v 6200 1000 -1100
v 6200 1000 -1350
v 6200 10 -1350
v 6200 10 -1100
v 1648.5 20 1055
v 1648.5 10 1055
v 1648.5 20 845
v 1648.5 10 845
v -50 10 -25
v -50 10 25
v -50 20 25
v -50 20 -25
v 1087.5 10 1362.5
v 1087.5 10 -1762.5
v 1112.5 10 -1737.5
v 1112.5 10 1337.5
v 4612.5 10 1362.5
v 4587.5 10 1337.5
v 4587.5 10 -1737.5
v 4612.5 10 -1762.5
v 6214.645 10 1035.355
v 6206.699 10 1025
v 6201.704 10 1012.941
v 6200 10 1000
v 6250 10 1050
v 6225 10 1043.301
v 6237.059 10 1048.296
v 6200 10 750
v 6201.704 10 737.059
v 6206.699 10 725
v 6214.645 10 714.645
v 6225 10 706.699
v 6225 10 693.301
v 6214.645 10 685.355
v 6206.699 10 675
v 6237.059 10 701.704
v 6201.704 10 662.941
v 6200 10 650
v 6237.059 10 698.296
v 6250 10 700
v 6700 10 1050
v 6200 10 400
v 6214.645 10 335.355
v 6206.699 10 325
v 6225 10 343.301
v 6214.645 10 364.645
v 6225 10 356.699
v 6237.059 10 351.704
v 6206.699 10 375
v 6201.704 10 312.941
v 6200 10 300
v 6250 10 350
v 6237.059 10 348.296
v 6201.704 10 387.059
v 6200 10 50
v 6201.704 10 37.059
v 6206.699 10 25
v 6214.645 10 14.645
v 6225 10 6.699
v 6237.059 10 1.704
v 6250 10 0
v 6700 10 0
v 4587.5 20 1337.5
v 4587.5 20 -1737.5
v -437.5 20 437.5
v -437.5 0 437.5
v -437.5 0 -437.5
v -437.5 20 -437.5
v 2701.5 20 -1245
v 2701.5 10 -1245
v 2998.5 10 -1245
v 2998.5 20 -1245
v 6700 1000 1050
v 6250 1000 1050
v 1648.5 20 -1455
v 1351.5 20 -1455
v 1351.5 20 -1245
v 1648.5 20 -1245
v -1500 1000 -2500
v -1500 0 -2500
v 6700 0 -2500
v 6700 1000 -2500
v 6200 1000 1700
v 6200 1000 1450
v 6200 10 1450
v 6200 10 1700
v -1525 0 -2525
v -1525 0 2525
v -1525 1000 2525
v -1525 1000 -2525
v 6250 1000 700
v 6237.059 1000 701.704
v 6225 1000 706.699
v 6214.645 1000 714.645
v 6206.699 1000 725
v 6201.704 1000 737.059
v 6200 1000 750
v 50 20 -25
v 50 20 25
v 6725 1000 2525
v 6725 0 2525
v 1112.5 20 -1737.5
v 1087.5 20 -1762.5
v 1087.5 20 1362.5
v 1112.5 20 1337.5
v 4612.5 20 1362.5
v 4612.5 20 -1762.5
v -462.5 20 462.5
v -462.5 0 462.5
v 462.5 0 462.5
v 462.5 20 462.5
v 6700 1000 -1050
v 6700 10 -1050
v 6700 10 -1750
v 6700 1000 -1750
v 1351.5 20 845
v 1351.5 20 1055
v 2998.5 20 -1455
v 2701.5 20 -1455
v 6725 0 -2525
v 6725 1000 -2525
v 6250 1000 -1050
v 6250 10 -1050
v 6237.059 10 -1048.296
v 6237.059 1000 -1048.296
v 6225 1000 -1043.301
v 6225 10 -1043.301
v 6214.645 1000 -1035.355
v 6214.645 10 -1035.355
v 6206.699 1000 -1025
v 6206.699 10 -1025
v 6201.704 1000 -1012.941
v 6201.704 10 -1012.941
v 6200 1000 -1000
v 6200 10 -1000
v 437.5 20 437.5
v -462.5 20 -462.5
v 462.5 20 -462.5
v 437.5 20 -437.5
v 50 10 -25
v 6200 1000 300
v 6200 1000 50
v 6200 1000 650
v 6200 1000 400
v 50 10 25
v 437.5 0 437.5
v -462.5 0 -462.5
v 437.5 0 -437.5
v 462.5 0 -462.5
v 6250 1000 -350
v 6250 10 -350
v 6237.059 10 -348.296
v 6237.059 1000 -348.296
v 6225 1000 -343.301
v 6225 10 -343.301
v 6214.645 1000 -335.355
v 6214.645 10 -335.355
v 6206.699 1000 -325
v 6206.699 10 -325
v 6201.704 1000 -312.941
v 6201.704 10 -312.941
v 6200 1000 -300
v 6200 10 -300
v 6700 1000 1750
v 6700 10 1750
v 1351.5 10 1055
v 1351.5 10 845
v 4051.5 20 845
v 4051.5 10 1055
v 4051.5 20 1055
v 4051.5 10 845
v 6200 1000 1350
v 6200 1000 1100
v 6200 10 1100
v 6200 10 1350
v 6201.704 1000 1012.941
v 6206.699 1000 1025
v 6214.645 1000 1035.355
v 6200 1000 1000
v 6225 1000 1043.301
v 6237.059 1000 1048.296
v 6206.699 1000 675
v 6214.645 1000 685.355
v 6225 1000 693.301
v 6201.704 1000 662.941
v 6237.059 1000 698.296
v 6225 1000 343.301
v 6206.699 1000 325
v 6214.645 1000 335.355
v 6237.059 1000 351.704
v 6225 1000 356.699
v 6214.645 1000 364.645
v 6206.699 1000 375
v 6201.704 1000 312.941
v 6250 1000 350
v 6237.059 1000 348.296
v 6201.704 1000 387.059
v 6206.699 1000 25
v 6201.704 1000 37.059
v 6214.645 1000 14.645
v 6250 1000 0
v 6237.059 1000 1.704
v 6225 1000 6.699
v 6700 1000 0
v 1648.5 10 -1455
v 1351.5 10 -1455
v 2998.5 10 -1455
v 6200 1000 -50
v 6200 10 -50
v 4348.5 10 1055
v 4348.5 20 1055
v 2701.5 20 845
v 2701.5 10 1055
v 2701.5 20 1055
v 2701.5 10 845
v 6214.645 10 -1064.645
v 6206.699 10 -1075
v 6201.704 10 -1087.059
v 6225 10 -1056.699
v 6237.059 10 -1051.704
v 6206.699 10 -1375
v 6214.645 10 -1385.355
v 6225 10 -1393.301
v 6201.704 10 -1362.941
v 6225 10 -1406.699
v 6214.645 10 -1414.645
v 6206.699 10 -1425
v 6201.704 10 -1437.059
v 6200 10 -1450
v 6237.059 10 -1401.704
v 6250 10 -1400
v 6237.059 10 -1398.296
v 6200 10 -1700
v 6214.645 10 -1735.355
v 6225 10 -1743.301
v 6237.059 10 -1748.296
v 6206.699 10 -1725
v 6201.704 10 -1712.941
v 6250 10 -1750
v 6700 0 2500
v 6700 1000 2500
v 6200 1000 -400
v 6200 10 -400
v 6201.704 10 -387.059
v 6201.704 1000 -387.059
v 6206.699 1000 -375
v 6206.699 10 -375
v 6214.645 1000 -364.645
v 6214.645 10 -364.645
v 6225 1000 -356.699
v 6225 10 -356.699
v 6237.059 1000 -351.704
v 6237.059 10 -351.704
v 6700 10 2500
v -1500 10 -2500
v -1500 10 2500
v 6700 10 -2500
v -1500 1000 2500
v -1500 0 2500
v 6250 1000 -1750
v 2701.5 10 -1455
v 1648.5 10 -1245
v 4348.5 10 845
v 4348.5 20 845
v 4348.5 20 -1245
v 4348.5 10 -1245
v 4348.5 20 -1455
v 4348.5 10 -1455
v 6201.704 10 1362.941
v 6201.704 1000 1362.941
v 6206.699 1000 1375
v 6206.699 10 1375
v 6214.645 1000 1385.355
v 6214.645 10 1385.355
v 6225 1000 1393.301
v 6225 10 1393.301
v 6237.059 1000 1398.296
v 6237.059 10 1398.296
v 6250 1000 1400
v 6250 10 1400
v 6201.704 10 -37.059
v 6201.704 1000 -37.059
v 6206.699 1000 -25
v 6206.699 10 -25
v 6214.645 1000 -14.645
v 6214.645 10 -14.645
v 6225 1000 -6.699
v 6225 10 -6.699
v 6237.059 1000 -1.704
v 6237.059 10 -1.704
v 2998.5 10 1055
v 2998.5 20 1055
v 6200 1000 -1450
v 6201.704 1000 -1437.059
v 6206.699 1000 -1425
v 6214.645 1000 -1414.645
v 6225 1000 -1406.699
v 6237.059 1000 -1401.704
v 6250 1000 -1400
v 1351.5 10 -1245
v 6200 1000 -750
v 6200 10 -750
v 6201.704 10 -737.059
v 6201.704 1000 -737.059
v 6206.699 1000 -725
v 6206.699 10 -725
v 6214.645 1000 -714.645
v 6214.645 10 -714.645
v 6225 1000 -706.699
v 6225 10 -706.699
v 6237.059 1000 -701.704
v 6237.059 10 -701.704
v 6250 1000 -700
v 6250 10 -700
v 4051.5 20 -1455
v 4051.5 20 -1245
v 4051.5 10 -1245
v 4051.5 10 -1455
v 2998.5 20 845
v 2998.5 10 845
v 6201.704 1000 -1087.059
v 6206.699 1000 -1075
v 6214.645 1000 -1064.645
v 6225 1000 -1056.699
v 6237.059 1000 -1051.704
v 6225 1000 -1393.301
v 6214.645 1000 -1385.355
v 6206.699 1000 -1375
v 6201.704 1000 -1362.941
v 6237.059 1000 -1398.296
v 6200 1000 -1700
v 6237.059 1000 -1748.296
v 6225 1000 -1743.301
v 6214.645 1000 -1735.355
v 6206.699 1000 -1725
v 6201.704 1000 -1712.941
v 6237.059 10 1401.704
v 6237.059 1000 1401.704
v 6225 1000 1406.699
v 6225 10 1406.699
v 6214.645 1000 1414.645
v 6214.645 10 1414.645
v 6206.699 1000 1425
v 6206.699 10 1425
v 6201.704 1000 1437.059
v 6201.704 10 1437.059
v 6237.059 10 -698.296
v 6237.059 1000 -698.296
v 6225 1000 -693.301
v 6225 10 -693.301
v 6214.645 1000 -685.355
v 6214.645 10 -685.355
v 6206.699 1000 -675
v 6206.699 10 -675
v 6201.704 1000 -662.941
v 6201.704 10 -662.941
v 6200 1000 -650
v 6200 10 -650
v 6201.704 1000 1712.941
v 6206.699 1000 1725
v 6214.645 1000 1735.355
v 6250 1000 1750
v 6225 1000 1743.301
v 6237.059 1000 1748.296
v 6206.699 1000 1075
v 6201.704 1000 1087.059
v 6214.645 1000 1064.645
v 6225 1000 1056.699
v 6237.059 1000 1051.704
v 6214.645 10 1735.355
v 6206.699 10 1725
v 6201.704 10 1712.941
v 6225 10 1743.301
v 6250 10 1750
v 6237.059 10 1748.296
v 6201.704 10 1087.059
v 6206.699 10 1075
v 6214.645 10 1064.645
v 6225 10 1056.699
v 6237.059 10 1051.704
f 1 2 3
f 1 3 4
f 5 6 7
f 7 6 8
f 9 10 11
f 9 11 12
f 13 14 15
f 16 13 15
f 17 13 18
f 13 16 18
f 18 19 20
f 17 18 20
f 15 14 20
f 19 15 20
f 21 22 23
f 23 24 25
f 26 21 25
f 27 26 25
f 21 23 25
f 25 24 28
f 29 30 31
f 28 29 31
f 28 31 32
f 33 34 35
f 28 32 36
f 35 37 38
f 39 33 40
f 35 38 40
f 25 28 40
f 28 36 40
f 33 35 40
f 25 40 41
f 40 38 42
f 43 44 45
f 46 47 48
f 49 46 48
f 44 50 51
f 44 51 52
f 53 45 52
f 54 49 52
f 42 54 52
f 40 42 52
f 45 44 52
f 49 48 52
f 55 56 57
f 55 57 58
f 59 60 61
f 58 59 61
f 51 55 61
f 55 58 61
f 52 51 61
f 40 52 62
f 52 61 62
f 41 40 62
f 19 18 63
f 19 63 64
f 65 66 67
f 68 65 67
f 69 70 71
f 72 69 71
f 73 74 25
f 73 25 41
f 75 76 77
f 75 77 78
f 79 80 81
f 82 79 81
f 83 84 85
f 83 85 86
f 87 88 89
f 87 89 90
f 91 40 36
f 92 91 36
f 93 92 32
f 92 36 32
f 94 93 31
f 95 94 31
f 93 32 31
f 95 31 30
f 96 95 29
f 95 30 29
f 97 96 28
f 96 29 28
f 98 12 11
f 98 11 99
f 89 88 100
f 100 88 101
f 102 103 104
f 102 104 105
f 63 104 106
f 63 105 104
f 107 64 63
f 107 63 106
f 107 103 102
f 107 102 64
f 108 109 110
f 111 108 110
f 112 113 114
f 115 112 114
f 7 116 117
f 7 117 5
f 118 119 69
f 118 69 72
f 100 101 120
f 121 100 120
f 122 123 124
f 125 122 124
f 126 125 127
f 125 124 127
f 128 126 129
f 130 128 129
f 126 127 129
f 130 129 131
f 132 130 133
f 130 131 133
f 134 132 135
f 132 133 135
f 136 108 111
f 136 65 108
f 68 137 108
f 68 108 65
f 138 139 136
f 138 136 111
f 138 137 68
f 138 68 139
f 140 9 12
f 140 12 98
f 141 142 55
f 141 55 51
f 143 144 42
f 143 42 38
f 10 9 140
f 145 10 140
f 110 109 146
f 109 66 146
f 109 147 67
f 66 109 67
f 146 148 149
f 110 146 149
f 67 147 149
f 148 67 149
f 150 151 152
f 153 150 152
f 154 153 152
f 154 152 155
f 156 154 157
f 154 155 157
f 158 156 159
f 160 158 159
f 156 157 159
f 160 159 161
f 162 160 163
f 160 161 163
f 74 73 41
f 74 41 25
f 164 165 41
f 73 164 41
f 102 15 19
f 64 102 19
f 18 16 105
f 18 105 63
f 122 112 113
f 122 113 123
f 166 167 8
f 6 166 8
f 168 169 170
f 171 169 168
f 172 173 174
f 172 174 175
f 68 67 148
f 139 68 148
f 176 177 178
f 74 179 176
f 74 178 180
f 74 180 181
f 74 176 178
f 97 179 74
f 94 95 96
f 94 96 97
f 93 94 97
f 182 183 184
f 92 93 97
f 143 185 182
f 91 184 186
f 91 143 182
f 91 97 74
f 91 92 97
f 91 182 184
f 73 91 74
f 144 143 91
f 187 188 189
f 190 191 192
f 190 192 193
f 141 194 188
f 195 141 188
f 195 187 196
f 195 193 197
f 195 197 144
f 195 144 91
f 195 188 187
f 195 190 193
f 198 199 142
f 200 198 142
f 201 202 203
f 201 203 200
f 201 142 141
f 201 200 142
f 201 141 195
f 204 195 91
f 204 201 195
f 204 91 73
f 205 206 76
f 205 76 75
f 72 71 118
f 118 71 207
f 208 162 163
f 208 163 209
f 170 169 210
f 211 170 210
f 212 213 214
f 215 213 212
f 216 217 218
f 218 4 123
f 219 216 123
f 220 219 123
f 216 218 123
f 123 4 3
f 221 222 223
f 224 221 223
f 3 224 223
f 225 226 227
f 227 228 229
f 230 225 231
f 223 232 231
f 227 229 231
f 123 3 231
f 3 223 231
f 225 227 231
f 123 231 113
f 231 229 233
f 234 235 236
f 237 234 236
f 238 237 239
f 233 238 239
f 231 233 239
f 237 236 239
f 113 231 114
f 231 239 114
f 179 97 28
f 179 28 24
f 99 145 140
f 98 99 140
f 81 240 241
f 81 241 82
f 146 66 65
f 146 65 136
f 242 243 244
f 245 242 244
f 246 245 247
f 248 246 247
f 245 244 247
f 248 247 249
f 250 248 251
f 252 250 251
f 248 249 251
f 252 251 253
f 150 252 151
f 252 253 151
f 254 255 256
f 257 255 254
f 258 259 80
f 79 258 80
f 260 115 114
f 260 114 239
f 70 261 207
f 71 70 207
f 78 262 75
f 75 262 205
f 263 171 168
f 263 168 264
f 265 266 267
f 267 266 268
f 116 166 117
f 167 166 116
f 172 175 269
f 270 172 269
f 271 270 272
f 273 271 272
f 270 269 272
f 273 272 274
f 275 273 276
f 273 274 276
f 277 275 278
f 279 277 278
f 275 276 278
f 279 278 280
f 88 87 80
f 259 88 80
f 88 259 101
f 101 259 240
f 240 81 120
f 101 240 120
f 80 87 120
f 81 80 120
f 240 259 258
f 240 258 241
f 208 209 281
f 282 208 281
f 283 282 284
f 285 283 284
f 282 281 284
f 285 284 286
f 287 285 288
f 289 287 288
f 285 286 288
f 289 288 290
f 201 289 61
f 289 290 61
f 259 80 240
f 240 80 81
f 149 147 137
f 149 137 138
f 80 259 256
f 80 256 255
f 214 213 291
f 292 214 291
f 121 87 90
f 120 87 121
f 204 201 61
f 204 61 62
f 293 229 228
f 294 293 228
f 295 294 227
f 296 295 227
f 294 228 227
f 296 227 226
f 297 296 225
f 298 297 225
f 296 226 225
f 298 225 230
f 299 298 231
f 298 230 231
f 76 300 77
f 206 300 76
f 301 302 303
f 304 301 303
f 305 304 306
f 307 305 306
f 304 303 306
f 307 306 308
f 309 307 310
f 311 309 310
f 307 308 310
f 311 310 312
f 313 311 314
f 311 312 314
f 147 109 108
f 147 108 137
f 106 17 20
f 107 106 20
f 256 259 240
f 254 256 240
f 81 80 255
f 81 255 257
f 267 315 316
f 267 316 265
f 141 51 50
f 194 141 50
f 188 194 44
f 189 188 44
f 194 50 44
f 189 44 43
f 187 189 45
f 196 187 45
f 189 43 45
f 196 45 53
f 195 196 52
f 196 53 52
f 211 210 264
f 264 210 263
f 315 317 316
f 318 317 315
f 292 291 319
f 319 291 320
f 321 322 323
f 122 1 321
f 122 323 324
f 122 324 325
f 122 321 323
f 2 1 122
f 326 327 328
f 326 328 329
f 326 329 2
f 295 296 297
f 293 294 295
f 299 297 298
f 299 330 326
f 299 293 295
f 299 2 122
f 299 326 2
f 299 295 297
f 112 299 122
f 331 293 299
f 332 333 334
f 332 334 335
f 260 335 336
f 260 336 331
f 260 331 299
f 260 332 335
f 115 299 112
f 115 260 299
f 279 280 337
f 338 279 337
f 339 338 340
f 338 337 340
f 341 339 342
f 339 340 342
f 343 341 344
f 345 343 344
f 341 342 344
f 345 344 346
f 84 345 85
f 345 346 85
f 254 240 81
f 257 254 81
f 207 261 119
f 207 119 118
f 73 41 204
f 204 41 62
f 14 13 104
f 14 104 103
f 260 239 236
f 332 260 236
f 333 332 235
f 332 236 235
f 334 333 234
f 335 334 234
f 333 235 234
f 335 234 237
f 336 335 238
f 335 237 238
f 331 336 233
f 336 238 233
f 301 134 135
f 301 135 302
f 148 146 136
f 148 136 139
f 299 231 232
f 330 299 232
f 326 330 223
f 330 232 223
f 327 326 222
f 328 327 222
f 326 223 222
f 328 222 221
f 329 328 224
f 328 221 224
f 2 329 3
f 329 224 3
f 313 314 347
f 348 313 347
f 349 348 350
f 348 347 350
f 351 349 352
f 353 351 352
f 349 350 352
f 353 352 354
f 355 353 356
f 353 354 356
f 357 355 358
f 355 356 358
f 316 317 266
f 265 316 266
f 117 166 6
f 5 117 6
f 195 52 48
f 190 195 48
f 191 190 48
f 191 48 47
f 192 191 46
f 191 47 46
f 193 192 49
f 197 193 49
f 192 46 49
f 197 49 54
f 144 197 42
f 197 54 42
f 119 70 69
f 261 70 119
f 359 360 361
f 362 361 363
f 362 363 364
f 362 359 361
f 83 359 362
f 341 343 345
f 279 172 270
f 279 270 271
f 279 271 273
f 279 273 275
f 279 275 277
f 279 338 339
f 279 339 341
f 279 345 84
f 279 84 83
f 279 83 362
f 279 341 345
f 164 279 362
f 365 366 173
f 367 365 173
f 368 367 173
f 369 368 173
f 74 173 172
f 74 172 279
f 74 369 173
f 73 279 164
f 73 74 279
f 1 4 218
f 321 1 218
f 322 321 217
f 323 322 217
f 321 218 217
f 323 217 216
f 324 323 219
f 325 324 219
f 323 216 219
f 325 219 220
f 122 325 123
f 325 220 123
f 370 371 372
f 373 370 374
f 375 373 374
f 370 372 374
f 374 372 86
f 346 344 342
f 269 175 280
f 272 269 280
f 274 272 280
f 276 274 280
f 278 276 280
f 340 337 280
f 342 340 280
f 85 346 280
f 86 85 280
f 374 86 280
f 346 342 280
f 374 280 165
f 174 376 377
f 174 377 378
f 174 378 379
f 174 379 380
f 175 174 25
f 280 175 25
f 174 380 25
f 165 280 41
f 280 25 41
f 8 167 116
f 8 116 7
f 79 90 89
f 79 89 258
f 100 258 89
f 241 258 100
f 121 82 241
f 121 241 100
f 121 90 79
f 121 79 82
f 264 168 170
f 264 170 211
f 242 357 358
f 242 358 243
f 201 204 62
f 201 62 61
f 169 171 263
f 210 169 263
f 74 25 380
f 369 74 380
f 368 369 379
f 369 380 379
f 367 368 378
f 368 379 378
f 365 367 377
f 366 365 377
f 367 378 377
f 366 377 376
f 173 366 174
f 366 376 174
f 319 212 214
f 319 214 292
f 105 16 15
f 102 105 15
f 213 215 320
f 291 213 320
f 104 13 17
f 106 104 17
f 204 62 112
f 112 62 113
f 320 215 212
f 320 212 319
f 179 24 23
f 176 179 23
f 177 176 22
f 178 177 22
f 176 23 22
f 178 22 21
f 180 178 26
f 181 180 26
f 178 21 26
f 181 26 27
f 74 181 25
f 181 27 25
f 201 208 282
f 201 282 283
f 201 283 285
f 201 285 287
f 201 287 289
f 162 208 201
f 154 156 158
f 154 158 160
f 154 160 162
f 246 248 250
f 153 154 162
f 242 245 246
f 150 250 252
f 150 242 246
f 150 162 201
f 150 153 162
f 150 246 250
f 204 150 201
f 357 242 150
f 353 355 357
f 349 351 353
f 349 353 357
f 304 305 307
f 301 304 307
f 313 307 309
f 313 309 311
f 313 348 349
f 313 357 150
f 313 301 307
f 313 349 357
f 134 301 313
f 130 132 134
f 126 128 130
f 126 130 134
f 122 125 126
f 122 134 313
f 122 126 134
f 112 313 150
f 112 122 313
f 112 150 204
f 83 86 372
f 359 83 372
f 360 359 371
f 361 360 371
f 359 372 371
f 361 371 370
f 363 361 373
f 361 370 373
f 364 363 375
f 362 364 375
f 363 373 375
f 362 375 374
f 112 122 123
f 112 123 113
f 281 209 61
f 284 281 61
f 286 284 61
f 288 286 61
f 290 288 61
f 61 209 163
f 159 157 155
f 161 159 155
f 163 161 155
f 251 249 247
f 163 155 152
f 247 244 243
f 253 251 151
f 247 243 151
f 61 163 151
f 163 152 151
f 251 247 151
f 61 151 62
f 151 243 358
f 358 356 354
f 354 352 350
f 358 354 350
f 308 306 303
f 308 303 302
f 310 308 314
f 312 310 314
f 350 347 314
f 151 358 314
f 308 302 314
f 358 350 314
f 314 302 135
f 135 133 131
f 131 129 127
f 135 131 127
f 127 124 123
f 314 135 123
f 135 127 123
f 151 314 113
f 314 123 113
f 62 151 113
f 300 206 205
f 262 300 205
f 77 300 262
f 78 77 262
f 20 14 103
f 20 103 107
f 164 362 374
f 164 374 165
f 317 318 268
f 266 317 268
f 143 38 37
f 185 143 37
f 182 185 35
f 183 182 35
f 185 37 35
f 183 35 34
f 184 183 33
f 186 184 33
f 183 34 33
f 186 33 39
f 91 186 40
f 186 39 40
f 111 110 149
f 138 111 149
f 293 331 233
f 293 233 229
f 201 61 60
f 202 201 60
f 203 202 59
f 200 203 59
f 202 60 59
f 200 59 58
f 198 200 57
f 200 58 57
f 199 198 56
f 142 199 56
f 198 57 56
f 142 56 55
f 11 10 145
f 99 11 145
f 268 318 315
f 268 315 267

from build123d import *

# Parameters (mm, degrees)
SKETCH1_W                = 8200
SKETCH1_H                = 5000
SKETCH1_W_2              = 900
SKETCH1_H_2              = 900
SKETCH1_W_3              = 100
SKETCH1_H_3              = 50
SKETCH1_W_4              = 3500
SKETCH1_H_4              = 3100
SKETCH1_W_5              = 297
SKETCH1_H_5              = 210
BOSS_EXTRUDE1_DEPTH      = 10
EXTRUDE_THIN1_DEPTH      = 10
EXTRUDE_THIN1_DEPTH_BACK = 10
EXTRUDE_THIN1_START      = 10
SKETCH1_4_W              = 925
SKETCH1_4_H              = 925
SKETCH1_4_W_2            = 875
SKETCH1_4_H_2            = 875
BOSS_EXTRUDE3_START      = 10
SKETCH1_5_W              = 100
SKETCH1_5_H              = 50
BOSS_EXTRUDE3_DEPTH      = 10
SKETCH1_6_W              = 8250
SKETCH1_6_H              = 5050
SKETCH1_6_W_2            = 8200
SKETCH1_6_H_2            = 5000
EXTRUDE_THIN2_DEPTH      = 1000
BOSS_EXTRUDE4_START      = 10
SKETCH1_7_W              = 297
SKETCH1_7_H              = 210
BOSS_EXTRUDE4_DEPTH      = 10
BOSS_EXTRUDE4_2_DEPTH    = 10
BOSS_EXTRUDE4_3_DEPTH    = 10
BOSS_EXTRUDE4_4_DEPTH    = 10
BOSS_EXTRUDE4_5_DEPTH    = 10
BOSS_EXTRUDE4_6_DEPTH    = 10
BOSS_EXTRUDE6_START      = 10
BOSS_EXTRUDE6_DEPTH      = 990
BOSS_EXTRUDE7_START      = 10
BOSS_EXTRUDE7_DEPTH      = 990
BOSS_EXTRUDE8_START      = 10
BOSS_EXTRUDE8_DEPTH      = 990
BOSS_EXTRUDE9_START      = 10
BOSS_EXTRUDE9_DEPTH      = 990
EXTRUDE_THIN3_START      = 10
SKETCH1_12_W             = 3525
SKETCH1_12_H             = 3125
SKETCH1_12_W_2           = 3475
SKETCH1_12_H_2           = 3075
EXTRUDE_THIN3_DEPTH      = 10


with BuildPart() as part:
    # Sketch1 → Boss-Extrude1 (new body)
    # profile 1 of 20: a face of its own
    with BuildSketch(Plane(origin=(0, 0, 0), x_dir=(1, 0, 0), z_dir=(0, 1, 0))):
        with Locations((2600, 0)):
            Rectangle(SKETCH1_W, SKETCH1_H)
        Rectangle(SKETCH1_W_2, SKETCH1_H_2, mode=Mode.SUBTRACT)
    # profile 2 of 20: a face of its own
    with BuildSketch(Plane(origin=(0, 0, 0), x_dir=(1, 0, 0), z_dir=(0, 1, 0))):
        Rectangle(SKETCH1_W_2, SKETCH1_H_2)
    # profile 3 of 20: a face of its own
    with BuildSketch(Plane(origin=(0, 0, 0), x_dir=(1, 0, 0), z_dir=(0, 1, 0))):
        Rectangle(SKETCH1_W_3, SKETCH1_H_3)
    # profile 4 of 20: a face of its own
    with BuildSketch(Plane(origin=(0, 0, 0), x_dir=(1, 0, 0), z_dir=(0, 1, 0))):
        with BuildLine():
            Line((6250, -1750), (6700, -1750))
            Line((6700, -1750), (6700, -1400))
            Line((6700, -1400), (6250, -1400))
            ThreePointArc((6250, -1400), (6214.64466094, -1414.64466094), (6200, -1450))
            Line((6200, -1450), (6200, -1700))
            ThreePointArc((6200, -1700), (6214.64466094, -1735.355339059), (6250, -1750))
        make_face()
    # profile 5 of 20: a face of its own
    with BuildSketch(Plane(origin=(0, 0, 0), x_dir=(1, 0, 0), z_dir=(0, 1, 0))):
        with BuildLine():
            Line((6250, -1400), (6700, -1400))
            Line((6700, -1400), (6700, -1050))
            Line((6700, -1050), (6250, -1050))
            ThreePointArc((6250, -1050), (6214.64466094, -1064.64466094), (6200, -1100))
            Line((6200, -1100), (6200, -1350))
            ThreePointArc((6200, -1350), (6214.64466094, -1385.355339059), (6250, -1400))
        make_face()
    # profile 6 of 20: a face of its own
    with BuildSketch(Plane(origin=(0, 0, 0), x_dir=(1, 0, 0), z_dir=(0, 1, 0))):
        with BuildLine():
            Line((6250, -1050), (6700, -1050))
            Line((6700, -1050), (6700, -700))
            Line((6700, -700), (6250, -700))
            ThreePointArc((6250, -700), (6214.644660941, -714.64466094), (6200, -750))
            Line((6200, -750), (6200, -1000))
            ThreePointArc((6200, -1000), (6214.644660941, -1035.355339059), (6250, -1050))
        make_face()
    # profile 7 of 20: a face of its own
    with BuildSketch(Plane(origin=(0, 0, 0), x_dir=(1, 0, 0), z_dir=(0, 1, 0))):
        with BuildLine():
            Line((6250, -700), (6700, -700))
            Line((6700, -700), (6700, -350))
            Line((6700, -350), (6250, -350))
            ThreePointArc((6250, -350), (6214.644660941, -364.64466094), (6200, -400))
            Line((6200, -400), (6200, -650))
            ThreePointArc((6200, -650), (6214.644660941, -685.355339059), (6250, -700))
        make_face()
    # profile 8 of 20: a face of its own
    with BuildSketch(Plane(origin=(0, 0, 0), x_dir=(1, 0, 0), z_dir=(0, 1, 0))):
        with BuildLine():
            Line((6250, -350), (6700, -350))
            Line((6700, -350), (6700, 0))
            Line((6700, 0), (6250, 0))
            ThreePointArc((6250, 0), (6214.644660941, -14.64466094), (6200, -50))
            Line((6200, -50), (6200, -300))
            ThreePointArc((6200, -300), (6214.644660941, -335.355339059), (6250, -350))
        make_face()
    # profile 9 of 20: a face of its own
    with BuildSketch(Plane(origin=(0, 0, 0), x_dir=(1, 0, 0), z_dir=(0, 1, 0))):
        with BuildLine():
            Line((6250, 0), (6700, 0))
            Line((6700, 0), (6700, 350))
            Line((6700, 350), (6250, 350))
            ThreePointArc((6250, 350), (6214.644660941, 335.35533906), (6200, 300))
            Line((6200, 300), (6200, 50))
            ThreePointArc((6200, 50), (6214.644660941, 14.644660941), (6250, 0))
        make_face()
    # profile 10 of 20: a face of its own
    with BuildSketch(Plane(origin=(0, 0, 0), x_dir=(1, 0, 0), z_dir=(0, 1, 0))):
        with BuildLine():
            Line((6700, 350), (6700, 700))
            Line((6700, 700), (6250, 700))
            ThreePointArc((6250, 700), (6214.644660941, 685.35533906), (6200, 650))
            Line((6200, 650), (6200, 400))
            ThreePointArc((6200, 400), (6214.644660941, 364.644660941), (6250, 350))
            Line((6250, 350), (6700, 350))
        make_face()
    # profile 11 of 20: a face of its own
    with BuildSketch(Plane(origin=(0, 0, 0), x_dir=(1, 0, 0), z_dir=(0, 1, 0))):
        with BuildLine():
            Line((6700, 1400), (6700, 1750))
            Line((6700, 1750), (6250, 1750))
            ThreePointArc((6250, 1750), (6214.644660941, 1735.35533906), (6200, 1700))
            Line((6200, 1700), (6200, 1450))
            ThreePointArc((6200, 1450), (6214.644660941, 1414.644660941), (6250, 1400))
            Line((6250, 1400), (6700, 1400))
        make_face()
    # profile 12 of 20: a face of its own
    with BuildSketch(Plane(origin=(0, 0, 0), x_dir=(1, 0, 0), z_dir=(0, 1, 0))):
        with BuildLine():
            Line((6700, 1050), (6700, 1400))
            Line((6700, 1400), (6250, 1400))
            ThreePointArc((6250, 1400), (6214.644660941, 1385.35533906), (6200, 1350))
            Line((6200, 1350), (6200, 1100))
            ThreePointArc((6200, 1100), (6214.644660941, 1064.644660941), (6250, 1050))
            Line((6250, 1050), (6700, 1050))
        make_face()
    # profile 13 of 20: a face of its own
    with BuildSketch(Plane(origin=(0, 0, 0), x_dir=(1, 0, 0), z_dir=(0, 1, 0))):
        with BuildLine():
            Line((6700, 700), (6700, 1050))
            Line((6700, 1050), (6250, 1050))
            ThreePointArc((6250, 1050), (6214.644660941, 1035.35533906), (6200, 1000))
            Line((6200, 1000), (6200, 750))
            ThreePointArc((6200, 750), (6214.644660941, 714.644660941), (6250, 700))
            Line((6250, 700), (6700, 700))
        make_face()
    # profile 14 of 20: a face of its own
    with BuildSketch(Plane(origin=(0, 0, 0), x_dir=(1, 0, 0), z_dir=(0, 1, 0))):
        with Locations((2850, 200)):
            Rectangle(SKETCH1_W_4, SKETCH1_H_4)
        with Locations((4200, -950)):
            Rectangle(SKETCH1_W_5, SKETCH1_H_5, mode=Mode.SUBTRACT)
        with Locations((2850, -950)):
            Rectangle(SKETCH1_W_5, SKETCH1_H_5, mode=Mode.SUBTRACT)
        with Locations((1500, -950)):
            Rectangle(SKETCH1_W_5, SKETCH1_H_5, mode=Mode.SUBTRACT)
        with Locations((4200, 1350)):
            Rectangle(SKETCH1_W_5, SKETCH1_H_5, mode=Mode.SUBTRACT)
        with Locations((2850, 1350)):
            Rectangle(SKETCH1_W_5, SKETCH1_H_5, mode=Mode.SUBTRACT)
        with Locations((1500, 1350)):
            Rectangle(SKETCH1_W_5, SKETCH1_H_5, mode=Mode.SUBTRACT)
    # profile 15 of 20: a face of its own
    with BuildSketch(Plane(origin=(0, 0, 0), x_dir=(1, 0, 0), z_dir=(0, 1, 0))):
        with Locations((1500, 1350)):
            Rectangle(SKETCH1_W_5, SKETCH1_H_5)
    # profile 16 of 20: a face of its own
    with BuildSketch(Plane(origin=(0, 0, 0), x_dir=(1, 0, 0), z_dir=(0, 1, 0))):
        with Locations((2850, 1350)):
            Rectangle(SKETCH1_W_5, SKETCH1_H_5)
    # profile 17 of 20: a face of its own
    with BuildSketch(Plane(origin=(0, 0, 0), x_dir=(1, 0, 0), z_dir=(0, 1, 0))):
        with Locations((4200, 1350)):
            Rectangle(SKETCH1_W_5, SKETCH1_H_5)
    # profile 18 of 20: a face of its own
    with BuildSketch(Plane(origin=(0, 0, 0), x_dir=(1, 0, 0), z_dir=(0, 1, 0))):
        with Locations((4200, -950)):
            Rectangle(SKETCH1_W_5, SKETCH1_H_5)
    # profile 19 of 20: a face of its own
    with BuildSketch(Plane(origin=(0, 0, 0), x_dir=(1, 0, 0), z_dir=(0, 1, 0))):
        with Locations((2850, -950)):
            Rectangle(SKETCH1_W_5, SKETCH1_H_5)
    # profile 20 of 20: a face of its own
    with BuildSketch(Plane(origin=(0, 0, 0), x_dir=(1, 0, 0), z_dir=(0, 1, 0))):
        with Locations((1500, -950)):
            Rectangle(SKETCH1_W_5, SKETCH1_H_5)
    extrude(amount=BOSS_EXTRUDE1_DEPTH)


with BuildPart() as body_2:
    # Sketch1<4> → Extrude-Thin1 (new, two sides: drawn at the far end of the back side and taken through both)
    with BuildSketch(Plane(origin=(0, 0, 0), x_dir=(1, 0, 0), z_dir=(0, 1, 0)).offset(EXTRUDE_THIN1_START - EXTRUDE_THIN1_DEPTH_BACK)):
        Rectangle(SKETCH1_4_W, SKETCH1_4_H)
        Rectangle(SKETCH1_4_W_2, SKETCH1_4_H_2, mode=Mode.SUBTRACT)
    extrude(amount=EXTRUDE_THIN1_DEPTH + EXTRUDE_THIN1_DEPTH_BACK)


with BuildPart() as body_3:
    # Sketch1<5> → Boss-Extrude3 (new body)
    with BuildSketch(Plane(origin=(0, 0, 0), x_dir=(1, 0, 0), z_dir=(0, 1, 0)).offset(BOSS_EXTRUDE3_START)):
        Rectangle(SKETCH1_5_W, SKETCH1_5_H)
    extrude(amount=BOSS_EXTRUDE3_DEPTH)


with BuildPart() as body_4:
    # Sketch1<6> → Extrude-Thin2 (new body)
    with BuildSketch(Plane(origin=(0, 0, 0), x_dir=(1, 0, 0), z_dir=(0, 1, 0))):
        with Locations((2600, 0)):
            Rectangle(SKETCH1_6_W, SKETCH1_6_H)
        with Locations((2600, 0)):
            Rectangle(SKETCH1_6_W_2, SKETCH1_6_H_2, mode=Mode.SUBTRACT)
    extrude(amount=EXTRUDE_THIN2_DEPTH)


with BuildPart() as body_5:
    # Sketch1<7> → Boss-Extrude4 (new body)
    with BuildSketch(Plane(origin=(0, 0, 0), x_dir=(1, 0, 0), z_dir=(0, 1, 0)).offset(BOSS_EXTRUDE4_START)):
        with Locations((2850, -950)):
            Rectangle(SKETCH1_7_W, SKETCH1_7_H)
    extrude(amount=BOSS_EXTRUDE4_DEPTH)


with BuildPart() as body_6:
    # Sketch1<7> → Boss-Extrude4 2 (new body)
    with BuildSketch(Plane(origin=(0, 0, 0), x_dir=(1, 0, 0), z_dir=(0, 1, 0)).offset(BOSS_EXTRUDE4_START)):
        with Locations((1500, -950)):
            Rectangle(SKETCH1_7_W, SKETCH1_7_H)
    extrude(amount=BOSS_EXTRUDE4_2_DEPTH)


with BuildPart() as body_7:
    # Sketch1<7> → Boss-Extrude4 3 (new body)
    with BuildSketch(Plane(origin=(0, 0, 0), x_dir=(1, 0, 0), z_dir=(0, 1, 0)).offset(BOSS_EXTRUDE4_START)):
        with Locations((1500, 1350)):
            Rectangle(SKETCH1_7_W, SKETCH1_7_H)
    extrude(amount=BOSS_EXTRUDE4_3_DEPTH)


with BuildPart() as body_8:
    # Sketch1<7> → Boss-Extrude4 4 (new body)
    with BuildSketch(Plane(origin=(0, 0, 0), x_dir=(1, 0, 0), z_dir=(0, 1, 0)).offset(BOSS_EXTRUDE4_START)):
        with Locations((2850, 1350)):
            Rectangle(SKETCH1_7_W, SKETCH1_7_H)
    extrude(amount=BOSS_EXTRUDE4_4_DEPTH)


with BuildPart() as body_9:
    # Sketch1<7> → Boss-Extrude4 5 (new body)
    with BuildSketch(Plane(origin=(0, 0, 0), x_dir=(1, 0, 0), z_dir=(0, 1, 0)).offset(BOSS_EXTRUDE4_START)):
        with Locations((4200, 1350)):
            Rectangle(SKETCH1_7_W, SKETCH1_7_H)
    extrude(amount=BOSS_EXTRUDE4_5_DEPTH)


with BuildPart() as body_10:
    # Sketch1<7> → Boss-Extrude4 6 (new body)
    with BuildSketch(Plane(origin=(0, 0, 0), x_dir=(1, 0, 0), z_dir=(0, 1, 0)).offset(BOSS_EXTRUDE4_START)):
        with Locations((4200, -950)):
            Rectangle(SKETCH1_7_W, SKETCH1_7_H)
    extrude(amount=BOSS_EXTRUDE4_6_DEPTH)


with BuildPart() as body_11:
    # Sketch1<8> → Boss-Extrude6 (new body)
    with BuildSketch(Plane(origin=(0, 0, 0), x_dir=(1, 0, 0), z_dir=(0, 1, 0)).offset(BOSS_EXTRUDE6_START)):
        with BuildLine():
            Line((6700, 1400), (6700, 1750))
            Line((6700, 1750), (6250, 1750))
            ThreePointArc((6250, 1750), (6214.644660941, 1735.35533906), (6200, 1700))
            Line((6200, 1700), (6200, 1450))
            ThreePointArc((6200, 1450), (6214.644660941, 1414.644660941), (6250, 1400))
            Line((6250, 1400), (6700, 1400))
        make_face()
        with BuildLine():
            Line((6700, 1050), (6700, 1400))
            Line((6700, 1400), (6250, 1400))
            ThreePointArc((6250, 1400), (6214.644660941, 1385.35533906), (6200, 1350))
            Line((6200, 1350), (6200, 1100))
            ThreePointArc((6200, 1100), (6214.644660941, 1064.644660941), (6250, 1050))
            Line((6250, 1050), (6700, 1050))
        make_face()
    extrude(amount=BOSS_EXTRUDE6_DEPTH)


with BuildPart() as body_12:
    # Sketch1<9> → Boss-Extrude7 (new body)
    with BuildSketch(Plane(origin=(0, 0, 0), x_dir=(1, 0, 0), z_dir=(0, 1, 0)).offset(BOSS_EXTRUDE7_START)):
        with BuildLine():
            Line((6700, 700), (6700, 1050))
            Line((6700, 1050), (6250, 1050))
            ThreePointArc((6250, 1050), (6214.644660941, 1035.35533906), (6200, 1000))
            Line((6200, 1000), (6200, 750))
            ThreePointArc((6200, 750), (6214.644660941, 714.644660941), (6250, 700))
            Line((6250, 700), (6700, 700))
        make_face()
        with BuildLine():
            Line((6700, 350), (6700, 700))
            Line((6700, 700), (6250, 700))
            ThreePointArc((6250, 700), (6214.644660941, 685.35533906), (6200, 650))
            Line((6200, 650), (6200, 400))
            ThreePointArc((6200, 400), (6214.644660941, 364.644660941), (6250, 350))
            Line((6250, 350), (6700, 350))
        make_face()
        with BuildLine():
            Line((6250, 0), (6700, 0))
            Line((6700, 0), (6700, 350))
            Line((6700, 350), (6250, 350))
            ThreePointArc((6250, 350), (6214.644660941, 335.35533906), (6200, 300))
            Line((6200, 300), (6200, 50))
            ThreePointArc((6200, 50), (6214.644660941, 14.644660941), (6250, 0))
        make_face()
    extrude(amount=BOSS_EXTRUDE7_DEPTH)


with BuildPart() as body_13:
    # Sketch1<10> → Boss-Extrude8 (new body)
    with BuildSketch(Plane(origin=(0, 0, 0), x_dir=(1, 0, 0), z_dir=(0, 1, 0)).offset(BOSS_EXTRUDE8_START)):
        with BuildLine():
            Line((6250, -700), (6700, -700))
            Line((6700, -700), (6700, -350))
            Line((6700, -350), (6250, -350))
            ThreePointArc((6250, -350), (6214.644660941, -364.64466094), (6200, -400))
            Line((6200, -400), (6200, -650))
            ThreePointArc((6200, -650), (6214.644660941, -685.355339059), (6250, -700))
        make_face()
        with BuildLine():
            Line((6250, -350), (6700, -350))
            Line((6700, -350), (6700, 0))
            Line((6700, 0), (6250, 0))
            ThreePointArc((6250, 0), (6214.644660941, -14.64466094), (6200, -50))
            Line((6200, -50), (6200, -300))
            ThreePointArc((6200, -300), (6214.644660941, -335.355339059), (6250, -350))
        make_face()
        with BuildLine():
            Line((6250, -1050), (6700, -1050))
            Line((6700, -1050), (6700, -700))
            Line((6700, -700), (6250, -700))
            ThreePointArc((6250, -700), (6214.644660941, -714.64466094), (6200, -750))
            Line((6200, -750), (6200, -1000))
            ThreePointArc((6200, -1000), (6214.644660941, -1035.355339059), (6250, -1050))
        make_face()
    extrude(amount=BOSS_EXTRUDE8_DEPTH)


with BuildPart() as body_14:
    # Sketch1<11> → Boss-Extrude9 (new body)
    with BuildSketch(Plane(origin=(0, 0, 0), x_dir=(1, 0, 0), z_dir=(0, 1, 0)).offset(BOSS_EXTRUDE9_START)):
        with BuildLine():
            Line((6250, -1400), (6700, -1400))
            Line((6700, -1400), (6700, -1050))
            Line((6700, -1050), (6250, -1050))
            ThreePointArc((6250, -1050), (6214.64466094, -1064.64466094), (6200, -1100))
            Line((6200, -1100), (6200, -1350))
            ThreePointArc((6200, -1350), (6214.64466094, -1385.355339059), (6250, -1400))
        make_face()
        with BuildLine():
            Line((6250, -1750), (6700, -1750))
            Line((6700, -1750), (6700, -1400))
            Line((6700, -1400), (6250, -1400))
            ThreePointArc((6250, -1400), (6214.64466094, -1414.64466094), (6200, -1450))
            Line((6200, -1450), (6200, -1700))
            ThreePointArc((6200, -1700), (6214.64466094, -1735.355339059), (6250, -1750))
        make_face()
    extrude(amount=BOSS_EXTRUDE9_DEPTH)


with BuildPart() as body_15:
    # Sketch1<12> → Extrude-Thin3 (new body)
    with BuildSketch(Plane(origin=(0, 0, 0), x_dir=(1, 0, 0), z_dir=(0, 1, 0)).offset(EXTRUDE_THIN3_START)):
        with Locations((2850, 200)):
            Rectangle(SKETCH1_12_W, SKETCH1_12_H)
        with Locations((2850, 200)):
            Rectangle(SKETCH1_12_W_2, SKETCH1_12_H_2, mode=Mode.SUBTRACT)
    extrude(amount=EXTRUDE_THIN3_DEPTH)


solid = Compound([part.part, body_2.part, body_3.part, body_4.part, body_5.part, body_6.part, body_7.part, body_8.part, body_9.part, body_10.part, body_11.part, body_12.part, body_13.part, body_14.part, body_15.part])
